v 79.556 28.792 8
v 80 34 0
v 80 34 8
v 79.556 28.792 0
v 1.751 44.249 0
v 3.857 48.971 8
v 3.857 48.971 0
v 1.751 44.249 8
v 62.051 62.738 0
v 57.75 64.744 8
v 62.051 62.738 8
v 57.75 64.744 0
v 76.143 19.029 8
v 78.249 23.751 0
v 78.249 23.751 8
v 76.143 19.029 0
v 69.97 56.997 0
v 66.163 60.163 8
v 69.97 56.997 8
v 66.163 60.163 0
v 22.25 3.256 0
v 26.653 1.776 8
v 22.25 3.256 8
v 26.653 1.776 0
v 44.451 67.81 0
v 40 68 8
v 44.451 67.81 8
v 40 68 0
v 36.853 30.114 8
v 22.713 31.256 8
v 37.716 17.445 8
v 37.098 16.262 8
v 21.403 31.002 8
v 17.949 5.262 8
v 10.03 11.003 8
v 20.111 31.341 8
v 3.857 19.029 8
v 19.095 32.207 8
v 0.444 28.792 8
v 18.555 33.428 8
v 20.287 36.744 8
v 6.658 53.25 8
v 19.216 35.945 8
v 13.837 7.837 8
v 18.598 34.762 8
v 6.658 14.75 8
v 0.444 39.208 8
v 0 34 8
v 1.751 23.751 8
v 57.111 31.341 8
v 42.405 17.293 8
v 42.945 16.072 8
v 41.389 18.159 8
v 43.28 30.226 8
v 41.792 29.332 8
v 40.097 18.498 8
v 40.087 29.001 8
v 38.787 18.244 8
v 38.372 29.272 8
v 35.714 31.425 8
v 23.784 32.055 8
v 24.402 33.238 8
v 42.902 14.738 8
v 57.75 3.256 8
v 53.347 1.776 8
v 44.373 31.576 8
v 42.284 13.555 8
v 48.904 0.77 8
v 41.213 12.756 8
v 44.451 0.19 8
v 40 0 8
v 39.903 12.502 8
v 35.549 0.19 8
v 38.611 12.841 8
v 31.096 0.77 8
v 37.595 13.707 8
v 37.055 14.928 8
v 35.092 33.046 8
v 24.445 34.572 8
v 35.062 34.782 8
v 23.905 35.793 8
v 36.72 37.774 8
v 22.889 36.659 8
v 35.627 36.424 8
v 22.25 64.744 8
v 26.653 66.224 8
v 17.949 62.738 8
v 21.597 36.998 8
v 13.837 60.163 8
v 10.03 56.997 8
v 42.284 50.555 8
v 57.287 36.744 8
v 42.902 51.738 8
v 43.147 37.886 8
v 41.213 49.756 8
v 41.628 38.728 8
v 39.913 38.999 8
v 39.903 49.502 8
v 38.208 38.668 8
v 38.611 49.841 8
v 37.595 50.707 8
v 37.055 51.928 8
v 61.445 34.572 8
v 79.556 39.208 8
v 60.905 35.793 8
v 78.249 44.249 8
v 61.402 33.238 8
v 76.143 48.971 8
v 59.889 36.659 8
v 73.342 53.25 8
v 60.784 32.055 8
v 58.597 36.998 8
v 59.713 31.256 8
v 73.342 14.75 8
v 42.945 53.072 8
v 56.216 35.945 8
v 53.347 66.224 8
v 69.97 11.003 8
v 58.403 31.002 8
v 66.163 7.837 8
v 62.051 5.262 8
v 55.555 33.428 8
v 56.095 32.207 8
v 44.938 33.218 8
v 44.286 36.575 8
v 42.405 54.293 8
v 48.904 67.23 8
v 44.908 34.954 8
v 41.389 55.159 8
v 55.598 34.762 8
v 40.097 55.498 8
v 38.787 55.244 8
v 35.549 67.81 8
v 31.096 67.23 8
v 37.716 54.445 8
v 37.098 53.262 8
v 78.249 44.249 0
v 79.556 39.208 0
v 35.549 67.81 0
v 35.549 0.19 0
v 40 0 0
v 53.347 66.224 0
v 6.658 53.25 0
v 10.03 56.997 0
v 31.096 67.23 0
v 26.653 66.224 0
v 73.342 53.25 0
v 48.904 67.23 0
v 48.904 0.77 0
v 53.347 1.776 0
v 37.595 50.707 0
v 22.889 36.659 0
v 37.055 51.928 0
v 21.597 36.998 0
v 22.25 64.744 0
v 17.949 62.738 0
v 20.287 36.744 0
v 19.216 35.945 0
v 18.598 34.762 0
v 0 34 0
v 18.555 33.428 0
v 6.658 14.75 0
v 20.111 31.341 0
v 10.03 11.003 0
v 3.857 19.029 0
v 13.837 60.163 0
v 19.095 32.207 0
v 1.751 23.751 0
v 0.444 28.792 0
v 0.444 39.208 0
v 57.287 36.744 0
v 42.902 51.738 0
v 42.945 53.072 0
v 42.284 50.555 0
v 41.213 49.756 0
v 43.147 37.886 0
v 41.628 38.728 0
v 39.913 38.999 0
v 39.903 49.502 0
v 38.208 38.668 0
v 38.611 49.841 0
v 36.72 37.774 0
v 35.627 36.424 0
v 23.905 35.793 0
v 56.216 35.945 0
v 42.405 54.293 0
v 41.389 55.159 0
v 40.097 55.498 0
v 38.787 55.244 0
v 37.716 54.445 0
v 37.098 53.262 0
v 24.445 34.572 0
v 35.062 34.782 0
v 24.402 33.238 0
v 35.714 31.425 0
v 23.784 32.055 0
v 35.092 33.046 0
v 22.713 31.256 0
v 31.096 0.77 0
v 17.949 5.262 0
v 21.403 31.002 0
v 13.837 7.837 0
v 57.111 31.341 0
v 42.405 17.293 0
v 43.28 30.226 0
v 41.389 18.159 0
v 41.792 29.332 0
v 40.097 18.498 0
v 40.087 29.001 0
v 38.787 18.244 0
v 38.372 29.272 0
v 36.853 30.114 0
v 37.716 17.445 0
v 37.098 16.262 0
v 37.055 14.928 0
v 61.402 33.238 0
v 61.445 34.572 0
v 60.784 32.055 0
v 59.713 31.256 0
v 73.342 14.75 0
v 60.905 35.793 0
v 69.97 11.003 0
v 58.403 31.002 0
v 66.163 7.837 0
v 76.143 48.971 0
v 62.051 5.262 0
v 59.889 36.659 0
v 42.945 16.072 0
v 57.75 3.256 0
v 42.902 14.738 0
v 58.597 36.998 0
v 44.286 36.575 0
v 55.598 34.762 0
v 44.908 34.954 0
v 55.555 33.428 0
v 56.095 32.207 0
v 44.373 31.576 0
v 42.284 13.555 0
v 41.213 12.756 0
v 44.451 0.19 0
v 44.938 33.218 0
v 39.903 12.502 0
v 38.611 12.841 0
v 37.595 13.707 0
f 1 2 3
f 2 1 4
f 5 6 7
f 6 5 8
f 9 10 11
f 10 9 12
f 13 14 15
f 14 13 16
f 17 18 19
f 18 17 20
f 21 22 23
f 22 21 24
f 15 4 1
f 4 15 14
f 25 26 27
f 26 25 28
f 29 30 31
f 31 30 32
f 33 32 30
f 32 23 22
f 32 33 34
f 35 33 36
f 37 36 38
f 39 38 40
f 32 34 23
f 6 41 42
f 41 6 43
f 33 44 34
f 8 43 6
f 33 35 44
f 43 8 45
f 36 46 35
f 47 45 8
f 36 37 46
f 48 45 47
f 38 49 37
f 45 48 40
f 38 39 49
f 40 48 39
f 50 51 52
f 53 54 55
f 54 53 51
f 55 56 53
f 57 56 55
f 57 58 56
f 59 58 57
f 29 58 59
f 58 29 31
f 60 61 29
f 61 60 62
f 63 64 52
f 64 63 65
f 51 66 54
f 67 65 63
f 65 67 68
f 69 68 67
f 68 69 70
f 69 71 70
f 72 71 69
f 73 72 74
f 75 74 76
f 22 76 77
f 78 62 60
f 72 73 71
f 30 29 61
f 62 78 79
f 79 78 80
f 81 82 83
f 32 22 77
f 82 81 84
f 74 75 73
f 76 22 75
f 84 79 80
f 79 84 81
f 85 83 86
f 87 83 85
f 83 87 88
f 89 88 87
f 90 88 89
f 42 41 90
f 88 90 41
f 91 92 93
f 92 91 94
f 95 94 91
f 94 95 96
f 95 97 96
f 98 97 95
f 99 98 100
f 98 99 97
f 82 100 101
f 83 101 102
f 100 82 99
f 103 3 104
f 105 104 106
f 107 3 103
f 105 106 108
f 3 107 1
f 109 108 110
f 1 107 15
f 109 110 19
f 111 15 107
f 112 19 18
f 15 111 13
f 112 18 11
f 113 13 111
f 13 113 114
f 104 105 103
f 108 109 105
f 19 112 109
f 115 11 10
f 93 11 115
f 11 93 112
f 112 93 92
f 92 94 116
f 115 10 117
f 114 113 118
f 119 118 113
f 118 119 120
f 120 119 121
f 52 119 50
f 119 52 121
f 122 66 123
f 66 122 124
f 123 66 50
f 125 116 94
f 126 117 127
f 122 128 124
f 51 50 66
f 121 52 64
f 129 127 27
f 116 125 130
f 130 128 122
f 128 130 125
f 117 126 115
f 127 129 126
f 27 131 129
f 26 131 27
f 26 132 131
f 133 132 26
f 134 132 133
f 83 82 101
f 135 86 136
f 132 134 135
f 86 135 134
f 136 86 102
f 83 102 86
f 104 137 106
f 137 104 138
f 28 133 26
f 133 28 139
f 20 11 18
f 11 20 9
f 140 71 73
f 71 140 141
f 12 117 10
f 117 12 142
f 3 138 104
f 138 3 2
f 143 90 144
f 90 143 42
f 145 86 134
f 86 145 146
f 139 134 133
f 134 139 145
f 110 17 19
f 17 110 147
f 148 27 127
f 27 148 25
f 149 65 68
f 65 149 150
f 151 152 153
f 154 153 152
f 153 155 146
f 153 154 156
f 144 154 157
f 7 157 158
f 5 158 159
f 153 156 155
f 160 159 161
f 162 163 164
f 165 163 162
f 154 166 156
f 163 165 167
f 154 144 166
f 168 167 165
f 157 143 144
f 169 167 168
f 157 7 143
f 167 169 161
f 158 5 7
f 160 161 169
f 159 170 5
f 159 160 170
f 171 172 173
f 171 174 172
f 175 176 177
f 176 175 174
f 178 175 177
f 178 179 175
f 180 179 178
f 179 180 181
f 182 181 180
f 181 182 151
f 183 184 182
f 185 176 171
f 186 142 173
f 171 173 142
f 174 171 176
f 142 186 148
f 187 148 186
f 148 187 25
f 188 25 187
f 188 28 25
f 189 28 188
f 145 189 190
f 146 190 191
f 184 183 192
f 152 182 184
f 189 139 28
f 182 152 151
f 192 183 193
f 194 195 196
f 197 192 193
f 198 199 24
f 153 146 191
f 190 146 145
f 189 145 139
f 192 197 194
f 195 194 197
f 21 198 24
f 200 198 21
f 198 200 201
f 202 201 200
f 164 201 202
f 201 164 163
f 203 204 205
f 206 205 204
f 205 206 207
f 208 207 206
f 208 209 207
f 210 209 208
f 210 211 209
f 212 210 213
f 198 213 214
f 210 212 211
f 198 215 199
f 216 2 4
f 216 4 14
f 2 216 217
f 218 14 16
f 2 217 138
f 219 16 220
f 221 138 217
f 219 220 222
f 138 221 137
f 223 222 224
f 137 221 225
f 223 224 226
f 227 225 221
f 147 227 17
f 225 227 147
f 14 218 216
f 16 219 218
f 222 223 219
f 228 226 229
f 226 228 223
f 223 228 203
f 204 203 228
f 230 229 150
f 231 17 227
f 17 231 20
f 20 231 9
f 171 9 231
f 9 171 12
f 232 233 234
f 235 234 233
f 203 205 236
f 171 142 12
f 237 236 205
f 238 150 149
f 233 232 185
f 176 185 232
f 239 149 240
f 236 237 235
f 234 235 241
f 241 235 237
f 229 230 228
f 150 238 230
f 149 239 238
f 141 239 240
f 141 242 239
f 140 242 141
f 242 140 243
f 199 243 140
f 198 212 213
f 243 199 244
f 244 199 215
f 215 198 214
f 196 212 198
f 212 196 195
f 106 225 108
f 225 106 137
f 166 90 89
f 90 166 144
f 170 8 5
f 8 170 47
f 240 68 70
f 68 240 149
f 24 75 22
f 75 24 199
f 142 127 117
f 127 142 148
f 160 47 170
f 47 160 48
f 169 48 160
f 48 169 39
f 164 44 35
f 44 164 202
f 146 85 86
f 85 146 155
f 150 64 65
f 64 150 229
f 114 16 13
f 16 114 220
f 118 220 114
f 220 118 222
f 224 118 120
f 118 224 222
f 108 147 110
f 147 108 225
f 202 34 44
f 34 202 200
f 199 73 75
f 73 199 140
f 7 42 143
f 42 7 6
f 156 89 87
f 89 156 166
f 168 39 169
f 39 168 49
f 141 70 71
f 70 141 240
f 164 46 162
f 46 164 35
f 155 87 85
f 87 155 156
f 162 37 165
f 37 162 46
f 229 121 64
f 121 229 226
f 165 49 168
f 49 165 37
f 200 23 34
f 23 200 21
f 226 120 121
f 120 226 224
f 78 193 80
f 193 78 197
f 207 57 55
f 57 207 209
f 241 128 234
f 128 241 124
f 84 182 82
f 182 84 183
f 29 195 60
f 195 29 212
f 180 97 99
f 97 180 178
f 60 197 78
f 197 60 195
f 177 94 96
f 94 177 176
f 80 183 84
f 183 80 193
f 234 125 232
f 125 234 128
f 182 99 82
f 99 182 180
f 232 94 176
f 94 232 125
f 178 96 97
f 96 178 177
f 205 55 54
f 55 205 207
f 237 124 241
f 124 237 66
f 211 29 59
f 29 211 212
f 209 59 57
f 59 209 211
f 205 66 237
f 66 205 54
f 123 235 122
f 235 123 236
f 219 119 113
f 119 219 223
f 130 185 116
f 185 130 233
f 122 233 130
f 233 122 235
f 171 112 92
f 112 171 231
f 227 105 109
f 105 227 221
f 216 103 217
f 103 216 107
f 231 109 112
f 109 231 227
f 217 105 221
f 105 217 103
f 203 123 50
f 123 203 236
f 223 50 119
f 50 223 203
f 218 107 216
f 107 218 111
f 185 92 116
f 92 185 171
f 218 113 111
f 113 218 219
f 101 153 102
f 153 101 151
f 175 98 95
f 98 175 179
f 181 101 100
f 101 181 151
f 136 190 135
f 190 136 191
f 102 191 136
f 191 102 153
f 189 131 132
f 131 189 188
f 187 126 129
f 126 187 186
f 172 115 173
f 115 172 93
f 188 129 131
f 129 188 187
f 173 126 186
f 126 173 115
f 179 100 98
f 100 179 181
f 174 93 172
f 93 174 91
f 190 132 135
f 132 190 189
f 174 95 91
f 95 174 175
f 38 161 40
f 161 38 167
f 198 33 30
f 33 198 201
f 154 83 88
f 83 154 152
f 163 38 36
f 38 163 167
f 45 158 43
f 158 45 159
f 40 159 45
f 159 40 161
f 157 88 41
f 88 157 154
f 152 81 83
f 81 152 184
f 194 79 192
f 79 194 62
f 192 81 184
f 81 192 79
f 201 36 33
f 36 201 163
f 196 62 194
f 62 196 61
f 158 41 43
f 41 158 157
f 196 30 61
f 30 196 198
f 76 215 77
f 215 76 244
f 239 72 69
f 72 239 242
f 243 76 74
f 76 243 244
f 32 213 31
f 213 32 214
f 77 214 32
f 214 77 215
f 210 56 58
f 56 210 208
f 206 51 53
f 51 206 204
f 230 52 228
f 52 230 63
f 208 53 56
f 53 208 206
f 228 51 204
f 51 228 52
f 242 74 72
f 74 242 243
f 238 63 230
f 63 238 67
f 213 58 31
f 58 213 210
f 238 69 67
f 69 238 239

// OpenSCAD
$fn = 32;

// ----------------------------------------------------------------------
// Cam plate: double_lobe cam, base R32
// ----------------------------------------------------------------------

// --- parameters (mm) ---
base_r = 32;              // base circle radius
lobe_h = 8;               // cam lobe rise
bore_r = 5;               // shaft bore radius
plate_t = 8;              // plate thickness, Z (extrusion height)
ring_r = 18.5;            // lightening ring radius
bolt_r = 3;               // lightening hole radius

profile = [[80, 34], [79.556, 39.208], [78.249, 44.249], [76.143, 48.971], [73.342, 53.25], [69.97, 56.997], [66.163, 60.163], [62.051, 62.738], [57.75, 64.744], [53.347, 66.224], [48.904, 67.23], [44.451, 67.81], [40, 68], [35.549, 67.81], [31.096, 67.23], [26.653, 66.224], [22.25, 64.744], [17.949, 62.738], [13.837, 60.163], [10.03, 56.997], [6.658, 53.25], [3.857, 48.971], [1.751, 44.249], [0.444, 39.208], [0, 34], [0.444, 28.792], [1.751, 23.751], [3.857, 19.029], [6.658, 14.75], [10.03, 11.003], [13.837, 7.837], [17.949, 5.262], [22.25, 3.256], [26.653, 1.776], [31.096, 0.77], [35.549, 0.19], [40, 0], [44.451, 0.19], [48.904, 0.77], [53.347, 1.776], [57.75, 3.256], [62.051, 5.262], [66.163, 7.837], [69.97, 11.003], [73.342, 14.75], [76.143, 19.029], [78.249, 23.751], [79.556, 28.792]];  // primary outline, 48 points, counter clockwise
void_1 = [[44.908, 34.954], [44.286, 36.575], [43.147, 37.886], [41.628, 38.728], [39.913, 38.999], [38.208, 38.668], [36.72, 37.774], [35.627, 36.424], [35.062, 34.782], [35.092, 33.046], [35.714, 31.425], [36.853, 30.114], [38.372, 29.272], [40.087, 29.001], [41.792, 29.332], [43.28, 30.226], [44.373, 31.576], [44.938, 33.218]];  // shaft bore, 18 points
void_2 = [[61.445, 34.572], [60.905, 35.793], [59.889, 36.659], [58.597, 36.998], [57.287, 36.744], [56.216, 35.945], [55.598, 34.762], [55.555, 33.428], [56.095, 32.207], [57.111, 31.341], [58.403, 31.002], [59.713, 31.256], [60.784, 32.055], [61.402, 33.238]];  // lightening hole 1, 14 points
void_3 = [[42.945, 53.072], [42.405, 54.293], [41.389, 55.159], [40.097, 55.498], [38.787, 55.244], [37.716, 54.445], [37.098, 53.262], [37.055, 51.928], [37.595, 50.707], [38.611, 49.841], [39.903, 49.502], [41.213, 49.756], [42.284, 50.555], [42.902, 51.738]];  // lightening hole 2, 14 points
void_4 = [[24.445, 34.572], [23.905, 35.793], [22.889, 36.659], [21.597, 36.998], [20.287, 36.744], [19.216, 35.945], [18.598, 34.762], [18.555, 33.428], [19.095, 32.207], [20.111, 31.341], [21.403, 31.002], [22.713, 31.256], [23.784, 32.055], [24.402, 33.238]];  // lightening hole 3, 14 points
void_5 = [[42.945, 16.072], [42.405, 17.293], [41.389, 18.159], [40.097, 18.498], [38.787, 18.244], [37.716, 17.445], [37.098, 16.262], [37.055, 14.928], [37.595, 13.707], [38.611, 12.841], [39.903, 12.502], [41.213, 12.756], [42.284, 13.555], [42.902, 14.738]];  // lightening hole 4, 14 points

// --- the one profile operation ---
difference() {
  linear_extrude(height = plate_t) polygon(points = profile);
  translate([0, 0, -1])
    linear_extrude(height = plate_t + 2) polygon(points = void_1);
  translate([0, 0, -1])
    linear_extrude(height = plate_t + 2) polygon(points = void_2);
  translate([0, 0, -1])
    linear_extrude(height = plate_t + 2) polygon(points = void_3);
  translate([0, 0, -1])
    linear_extrude(height = plate_t + 2) polygon(points = void_4);
  translate([0, 0, -1])
    linear_extrude(height = plate_t + 2) polygon(points = void_5);
}
